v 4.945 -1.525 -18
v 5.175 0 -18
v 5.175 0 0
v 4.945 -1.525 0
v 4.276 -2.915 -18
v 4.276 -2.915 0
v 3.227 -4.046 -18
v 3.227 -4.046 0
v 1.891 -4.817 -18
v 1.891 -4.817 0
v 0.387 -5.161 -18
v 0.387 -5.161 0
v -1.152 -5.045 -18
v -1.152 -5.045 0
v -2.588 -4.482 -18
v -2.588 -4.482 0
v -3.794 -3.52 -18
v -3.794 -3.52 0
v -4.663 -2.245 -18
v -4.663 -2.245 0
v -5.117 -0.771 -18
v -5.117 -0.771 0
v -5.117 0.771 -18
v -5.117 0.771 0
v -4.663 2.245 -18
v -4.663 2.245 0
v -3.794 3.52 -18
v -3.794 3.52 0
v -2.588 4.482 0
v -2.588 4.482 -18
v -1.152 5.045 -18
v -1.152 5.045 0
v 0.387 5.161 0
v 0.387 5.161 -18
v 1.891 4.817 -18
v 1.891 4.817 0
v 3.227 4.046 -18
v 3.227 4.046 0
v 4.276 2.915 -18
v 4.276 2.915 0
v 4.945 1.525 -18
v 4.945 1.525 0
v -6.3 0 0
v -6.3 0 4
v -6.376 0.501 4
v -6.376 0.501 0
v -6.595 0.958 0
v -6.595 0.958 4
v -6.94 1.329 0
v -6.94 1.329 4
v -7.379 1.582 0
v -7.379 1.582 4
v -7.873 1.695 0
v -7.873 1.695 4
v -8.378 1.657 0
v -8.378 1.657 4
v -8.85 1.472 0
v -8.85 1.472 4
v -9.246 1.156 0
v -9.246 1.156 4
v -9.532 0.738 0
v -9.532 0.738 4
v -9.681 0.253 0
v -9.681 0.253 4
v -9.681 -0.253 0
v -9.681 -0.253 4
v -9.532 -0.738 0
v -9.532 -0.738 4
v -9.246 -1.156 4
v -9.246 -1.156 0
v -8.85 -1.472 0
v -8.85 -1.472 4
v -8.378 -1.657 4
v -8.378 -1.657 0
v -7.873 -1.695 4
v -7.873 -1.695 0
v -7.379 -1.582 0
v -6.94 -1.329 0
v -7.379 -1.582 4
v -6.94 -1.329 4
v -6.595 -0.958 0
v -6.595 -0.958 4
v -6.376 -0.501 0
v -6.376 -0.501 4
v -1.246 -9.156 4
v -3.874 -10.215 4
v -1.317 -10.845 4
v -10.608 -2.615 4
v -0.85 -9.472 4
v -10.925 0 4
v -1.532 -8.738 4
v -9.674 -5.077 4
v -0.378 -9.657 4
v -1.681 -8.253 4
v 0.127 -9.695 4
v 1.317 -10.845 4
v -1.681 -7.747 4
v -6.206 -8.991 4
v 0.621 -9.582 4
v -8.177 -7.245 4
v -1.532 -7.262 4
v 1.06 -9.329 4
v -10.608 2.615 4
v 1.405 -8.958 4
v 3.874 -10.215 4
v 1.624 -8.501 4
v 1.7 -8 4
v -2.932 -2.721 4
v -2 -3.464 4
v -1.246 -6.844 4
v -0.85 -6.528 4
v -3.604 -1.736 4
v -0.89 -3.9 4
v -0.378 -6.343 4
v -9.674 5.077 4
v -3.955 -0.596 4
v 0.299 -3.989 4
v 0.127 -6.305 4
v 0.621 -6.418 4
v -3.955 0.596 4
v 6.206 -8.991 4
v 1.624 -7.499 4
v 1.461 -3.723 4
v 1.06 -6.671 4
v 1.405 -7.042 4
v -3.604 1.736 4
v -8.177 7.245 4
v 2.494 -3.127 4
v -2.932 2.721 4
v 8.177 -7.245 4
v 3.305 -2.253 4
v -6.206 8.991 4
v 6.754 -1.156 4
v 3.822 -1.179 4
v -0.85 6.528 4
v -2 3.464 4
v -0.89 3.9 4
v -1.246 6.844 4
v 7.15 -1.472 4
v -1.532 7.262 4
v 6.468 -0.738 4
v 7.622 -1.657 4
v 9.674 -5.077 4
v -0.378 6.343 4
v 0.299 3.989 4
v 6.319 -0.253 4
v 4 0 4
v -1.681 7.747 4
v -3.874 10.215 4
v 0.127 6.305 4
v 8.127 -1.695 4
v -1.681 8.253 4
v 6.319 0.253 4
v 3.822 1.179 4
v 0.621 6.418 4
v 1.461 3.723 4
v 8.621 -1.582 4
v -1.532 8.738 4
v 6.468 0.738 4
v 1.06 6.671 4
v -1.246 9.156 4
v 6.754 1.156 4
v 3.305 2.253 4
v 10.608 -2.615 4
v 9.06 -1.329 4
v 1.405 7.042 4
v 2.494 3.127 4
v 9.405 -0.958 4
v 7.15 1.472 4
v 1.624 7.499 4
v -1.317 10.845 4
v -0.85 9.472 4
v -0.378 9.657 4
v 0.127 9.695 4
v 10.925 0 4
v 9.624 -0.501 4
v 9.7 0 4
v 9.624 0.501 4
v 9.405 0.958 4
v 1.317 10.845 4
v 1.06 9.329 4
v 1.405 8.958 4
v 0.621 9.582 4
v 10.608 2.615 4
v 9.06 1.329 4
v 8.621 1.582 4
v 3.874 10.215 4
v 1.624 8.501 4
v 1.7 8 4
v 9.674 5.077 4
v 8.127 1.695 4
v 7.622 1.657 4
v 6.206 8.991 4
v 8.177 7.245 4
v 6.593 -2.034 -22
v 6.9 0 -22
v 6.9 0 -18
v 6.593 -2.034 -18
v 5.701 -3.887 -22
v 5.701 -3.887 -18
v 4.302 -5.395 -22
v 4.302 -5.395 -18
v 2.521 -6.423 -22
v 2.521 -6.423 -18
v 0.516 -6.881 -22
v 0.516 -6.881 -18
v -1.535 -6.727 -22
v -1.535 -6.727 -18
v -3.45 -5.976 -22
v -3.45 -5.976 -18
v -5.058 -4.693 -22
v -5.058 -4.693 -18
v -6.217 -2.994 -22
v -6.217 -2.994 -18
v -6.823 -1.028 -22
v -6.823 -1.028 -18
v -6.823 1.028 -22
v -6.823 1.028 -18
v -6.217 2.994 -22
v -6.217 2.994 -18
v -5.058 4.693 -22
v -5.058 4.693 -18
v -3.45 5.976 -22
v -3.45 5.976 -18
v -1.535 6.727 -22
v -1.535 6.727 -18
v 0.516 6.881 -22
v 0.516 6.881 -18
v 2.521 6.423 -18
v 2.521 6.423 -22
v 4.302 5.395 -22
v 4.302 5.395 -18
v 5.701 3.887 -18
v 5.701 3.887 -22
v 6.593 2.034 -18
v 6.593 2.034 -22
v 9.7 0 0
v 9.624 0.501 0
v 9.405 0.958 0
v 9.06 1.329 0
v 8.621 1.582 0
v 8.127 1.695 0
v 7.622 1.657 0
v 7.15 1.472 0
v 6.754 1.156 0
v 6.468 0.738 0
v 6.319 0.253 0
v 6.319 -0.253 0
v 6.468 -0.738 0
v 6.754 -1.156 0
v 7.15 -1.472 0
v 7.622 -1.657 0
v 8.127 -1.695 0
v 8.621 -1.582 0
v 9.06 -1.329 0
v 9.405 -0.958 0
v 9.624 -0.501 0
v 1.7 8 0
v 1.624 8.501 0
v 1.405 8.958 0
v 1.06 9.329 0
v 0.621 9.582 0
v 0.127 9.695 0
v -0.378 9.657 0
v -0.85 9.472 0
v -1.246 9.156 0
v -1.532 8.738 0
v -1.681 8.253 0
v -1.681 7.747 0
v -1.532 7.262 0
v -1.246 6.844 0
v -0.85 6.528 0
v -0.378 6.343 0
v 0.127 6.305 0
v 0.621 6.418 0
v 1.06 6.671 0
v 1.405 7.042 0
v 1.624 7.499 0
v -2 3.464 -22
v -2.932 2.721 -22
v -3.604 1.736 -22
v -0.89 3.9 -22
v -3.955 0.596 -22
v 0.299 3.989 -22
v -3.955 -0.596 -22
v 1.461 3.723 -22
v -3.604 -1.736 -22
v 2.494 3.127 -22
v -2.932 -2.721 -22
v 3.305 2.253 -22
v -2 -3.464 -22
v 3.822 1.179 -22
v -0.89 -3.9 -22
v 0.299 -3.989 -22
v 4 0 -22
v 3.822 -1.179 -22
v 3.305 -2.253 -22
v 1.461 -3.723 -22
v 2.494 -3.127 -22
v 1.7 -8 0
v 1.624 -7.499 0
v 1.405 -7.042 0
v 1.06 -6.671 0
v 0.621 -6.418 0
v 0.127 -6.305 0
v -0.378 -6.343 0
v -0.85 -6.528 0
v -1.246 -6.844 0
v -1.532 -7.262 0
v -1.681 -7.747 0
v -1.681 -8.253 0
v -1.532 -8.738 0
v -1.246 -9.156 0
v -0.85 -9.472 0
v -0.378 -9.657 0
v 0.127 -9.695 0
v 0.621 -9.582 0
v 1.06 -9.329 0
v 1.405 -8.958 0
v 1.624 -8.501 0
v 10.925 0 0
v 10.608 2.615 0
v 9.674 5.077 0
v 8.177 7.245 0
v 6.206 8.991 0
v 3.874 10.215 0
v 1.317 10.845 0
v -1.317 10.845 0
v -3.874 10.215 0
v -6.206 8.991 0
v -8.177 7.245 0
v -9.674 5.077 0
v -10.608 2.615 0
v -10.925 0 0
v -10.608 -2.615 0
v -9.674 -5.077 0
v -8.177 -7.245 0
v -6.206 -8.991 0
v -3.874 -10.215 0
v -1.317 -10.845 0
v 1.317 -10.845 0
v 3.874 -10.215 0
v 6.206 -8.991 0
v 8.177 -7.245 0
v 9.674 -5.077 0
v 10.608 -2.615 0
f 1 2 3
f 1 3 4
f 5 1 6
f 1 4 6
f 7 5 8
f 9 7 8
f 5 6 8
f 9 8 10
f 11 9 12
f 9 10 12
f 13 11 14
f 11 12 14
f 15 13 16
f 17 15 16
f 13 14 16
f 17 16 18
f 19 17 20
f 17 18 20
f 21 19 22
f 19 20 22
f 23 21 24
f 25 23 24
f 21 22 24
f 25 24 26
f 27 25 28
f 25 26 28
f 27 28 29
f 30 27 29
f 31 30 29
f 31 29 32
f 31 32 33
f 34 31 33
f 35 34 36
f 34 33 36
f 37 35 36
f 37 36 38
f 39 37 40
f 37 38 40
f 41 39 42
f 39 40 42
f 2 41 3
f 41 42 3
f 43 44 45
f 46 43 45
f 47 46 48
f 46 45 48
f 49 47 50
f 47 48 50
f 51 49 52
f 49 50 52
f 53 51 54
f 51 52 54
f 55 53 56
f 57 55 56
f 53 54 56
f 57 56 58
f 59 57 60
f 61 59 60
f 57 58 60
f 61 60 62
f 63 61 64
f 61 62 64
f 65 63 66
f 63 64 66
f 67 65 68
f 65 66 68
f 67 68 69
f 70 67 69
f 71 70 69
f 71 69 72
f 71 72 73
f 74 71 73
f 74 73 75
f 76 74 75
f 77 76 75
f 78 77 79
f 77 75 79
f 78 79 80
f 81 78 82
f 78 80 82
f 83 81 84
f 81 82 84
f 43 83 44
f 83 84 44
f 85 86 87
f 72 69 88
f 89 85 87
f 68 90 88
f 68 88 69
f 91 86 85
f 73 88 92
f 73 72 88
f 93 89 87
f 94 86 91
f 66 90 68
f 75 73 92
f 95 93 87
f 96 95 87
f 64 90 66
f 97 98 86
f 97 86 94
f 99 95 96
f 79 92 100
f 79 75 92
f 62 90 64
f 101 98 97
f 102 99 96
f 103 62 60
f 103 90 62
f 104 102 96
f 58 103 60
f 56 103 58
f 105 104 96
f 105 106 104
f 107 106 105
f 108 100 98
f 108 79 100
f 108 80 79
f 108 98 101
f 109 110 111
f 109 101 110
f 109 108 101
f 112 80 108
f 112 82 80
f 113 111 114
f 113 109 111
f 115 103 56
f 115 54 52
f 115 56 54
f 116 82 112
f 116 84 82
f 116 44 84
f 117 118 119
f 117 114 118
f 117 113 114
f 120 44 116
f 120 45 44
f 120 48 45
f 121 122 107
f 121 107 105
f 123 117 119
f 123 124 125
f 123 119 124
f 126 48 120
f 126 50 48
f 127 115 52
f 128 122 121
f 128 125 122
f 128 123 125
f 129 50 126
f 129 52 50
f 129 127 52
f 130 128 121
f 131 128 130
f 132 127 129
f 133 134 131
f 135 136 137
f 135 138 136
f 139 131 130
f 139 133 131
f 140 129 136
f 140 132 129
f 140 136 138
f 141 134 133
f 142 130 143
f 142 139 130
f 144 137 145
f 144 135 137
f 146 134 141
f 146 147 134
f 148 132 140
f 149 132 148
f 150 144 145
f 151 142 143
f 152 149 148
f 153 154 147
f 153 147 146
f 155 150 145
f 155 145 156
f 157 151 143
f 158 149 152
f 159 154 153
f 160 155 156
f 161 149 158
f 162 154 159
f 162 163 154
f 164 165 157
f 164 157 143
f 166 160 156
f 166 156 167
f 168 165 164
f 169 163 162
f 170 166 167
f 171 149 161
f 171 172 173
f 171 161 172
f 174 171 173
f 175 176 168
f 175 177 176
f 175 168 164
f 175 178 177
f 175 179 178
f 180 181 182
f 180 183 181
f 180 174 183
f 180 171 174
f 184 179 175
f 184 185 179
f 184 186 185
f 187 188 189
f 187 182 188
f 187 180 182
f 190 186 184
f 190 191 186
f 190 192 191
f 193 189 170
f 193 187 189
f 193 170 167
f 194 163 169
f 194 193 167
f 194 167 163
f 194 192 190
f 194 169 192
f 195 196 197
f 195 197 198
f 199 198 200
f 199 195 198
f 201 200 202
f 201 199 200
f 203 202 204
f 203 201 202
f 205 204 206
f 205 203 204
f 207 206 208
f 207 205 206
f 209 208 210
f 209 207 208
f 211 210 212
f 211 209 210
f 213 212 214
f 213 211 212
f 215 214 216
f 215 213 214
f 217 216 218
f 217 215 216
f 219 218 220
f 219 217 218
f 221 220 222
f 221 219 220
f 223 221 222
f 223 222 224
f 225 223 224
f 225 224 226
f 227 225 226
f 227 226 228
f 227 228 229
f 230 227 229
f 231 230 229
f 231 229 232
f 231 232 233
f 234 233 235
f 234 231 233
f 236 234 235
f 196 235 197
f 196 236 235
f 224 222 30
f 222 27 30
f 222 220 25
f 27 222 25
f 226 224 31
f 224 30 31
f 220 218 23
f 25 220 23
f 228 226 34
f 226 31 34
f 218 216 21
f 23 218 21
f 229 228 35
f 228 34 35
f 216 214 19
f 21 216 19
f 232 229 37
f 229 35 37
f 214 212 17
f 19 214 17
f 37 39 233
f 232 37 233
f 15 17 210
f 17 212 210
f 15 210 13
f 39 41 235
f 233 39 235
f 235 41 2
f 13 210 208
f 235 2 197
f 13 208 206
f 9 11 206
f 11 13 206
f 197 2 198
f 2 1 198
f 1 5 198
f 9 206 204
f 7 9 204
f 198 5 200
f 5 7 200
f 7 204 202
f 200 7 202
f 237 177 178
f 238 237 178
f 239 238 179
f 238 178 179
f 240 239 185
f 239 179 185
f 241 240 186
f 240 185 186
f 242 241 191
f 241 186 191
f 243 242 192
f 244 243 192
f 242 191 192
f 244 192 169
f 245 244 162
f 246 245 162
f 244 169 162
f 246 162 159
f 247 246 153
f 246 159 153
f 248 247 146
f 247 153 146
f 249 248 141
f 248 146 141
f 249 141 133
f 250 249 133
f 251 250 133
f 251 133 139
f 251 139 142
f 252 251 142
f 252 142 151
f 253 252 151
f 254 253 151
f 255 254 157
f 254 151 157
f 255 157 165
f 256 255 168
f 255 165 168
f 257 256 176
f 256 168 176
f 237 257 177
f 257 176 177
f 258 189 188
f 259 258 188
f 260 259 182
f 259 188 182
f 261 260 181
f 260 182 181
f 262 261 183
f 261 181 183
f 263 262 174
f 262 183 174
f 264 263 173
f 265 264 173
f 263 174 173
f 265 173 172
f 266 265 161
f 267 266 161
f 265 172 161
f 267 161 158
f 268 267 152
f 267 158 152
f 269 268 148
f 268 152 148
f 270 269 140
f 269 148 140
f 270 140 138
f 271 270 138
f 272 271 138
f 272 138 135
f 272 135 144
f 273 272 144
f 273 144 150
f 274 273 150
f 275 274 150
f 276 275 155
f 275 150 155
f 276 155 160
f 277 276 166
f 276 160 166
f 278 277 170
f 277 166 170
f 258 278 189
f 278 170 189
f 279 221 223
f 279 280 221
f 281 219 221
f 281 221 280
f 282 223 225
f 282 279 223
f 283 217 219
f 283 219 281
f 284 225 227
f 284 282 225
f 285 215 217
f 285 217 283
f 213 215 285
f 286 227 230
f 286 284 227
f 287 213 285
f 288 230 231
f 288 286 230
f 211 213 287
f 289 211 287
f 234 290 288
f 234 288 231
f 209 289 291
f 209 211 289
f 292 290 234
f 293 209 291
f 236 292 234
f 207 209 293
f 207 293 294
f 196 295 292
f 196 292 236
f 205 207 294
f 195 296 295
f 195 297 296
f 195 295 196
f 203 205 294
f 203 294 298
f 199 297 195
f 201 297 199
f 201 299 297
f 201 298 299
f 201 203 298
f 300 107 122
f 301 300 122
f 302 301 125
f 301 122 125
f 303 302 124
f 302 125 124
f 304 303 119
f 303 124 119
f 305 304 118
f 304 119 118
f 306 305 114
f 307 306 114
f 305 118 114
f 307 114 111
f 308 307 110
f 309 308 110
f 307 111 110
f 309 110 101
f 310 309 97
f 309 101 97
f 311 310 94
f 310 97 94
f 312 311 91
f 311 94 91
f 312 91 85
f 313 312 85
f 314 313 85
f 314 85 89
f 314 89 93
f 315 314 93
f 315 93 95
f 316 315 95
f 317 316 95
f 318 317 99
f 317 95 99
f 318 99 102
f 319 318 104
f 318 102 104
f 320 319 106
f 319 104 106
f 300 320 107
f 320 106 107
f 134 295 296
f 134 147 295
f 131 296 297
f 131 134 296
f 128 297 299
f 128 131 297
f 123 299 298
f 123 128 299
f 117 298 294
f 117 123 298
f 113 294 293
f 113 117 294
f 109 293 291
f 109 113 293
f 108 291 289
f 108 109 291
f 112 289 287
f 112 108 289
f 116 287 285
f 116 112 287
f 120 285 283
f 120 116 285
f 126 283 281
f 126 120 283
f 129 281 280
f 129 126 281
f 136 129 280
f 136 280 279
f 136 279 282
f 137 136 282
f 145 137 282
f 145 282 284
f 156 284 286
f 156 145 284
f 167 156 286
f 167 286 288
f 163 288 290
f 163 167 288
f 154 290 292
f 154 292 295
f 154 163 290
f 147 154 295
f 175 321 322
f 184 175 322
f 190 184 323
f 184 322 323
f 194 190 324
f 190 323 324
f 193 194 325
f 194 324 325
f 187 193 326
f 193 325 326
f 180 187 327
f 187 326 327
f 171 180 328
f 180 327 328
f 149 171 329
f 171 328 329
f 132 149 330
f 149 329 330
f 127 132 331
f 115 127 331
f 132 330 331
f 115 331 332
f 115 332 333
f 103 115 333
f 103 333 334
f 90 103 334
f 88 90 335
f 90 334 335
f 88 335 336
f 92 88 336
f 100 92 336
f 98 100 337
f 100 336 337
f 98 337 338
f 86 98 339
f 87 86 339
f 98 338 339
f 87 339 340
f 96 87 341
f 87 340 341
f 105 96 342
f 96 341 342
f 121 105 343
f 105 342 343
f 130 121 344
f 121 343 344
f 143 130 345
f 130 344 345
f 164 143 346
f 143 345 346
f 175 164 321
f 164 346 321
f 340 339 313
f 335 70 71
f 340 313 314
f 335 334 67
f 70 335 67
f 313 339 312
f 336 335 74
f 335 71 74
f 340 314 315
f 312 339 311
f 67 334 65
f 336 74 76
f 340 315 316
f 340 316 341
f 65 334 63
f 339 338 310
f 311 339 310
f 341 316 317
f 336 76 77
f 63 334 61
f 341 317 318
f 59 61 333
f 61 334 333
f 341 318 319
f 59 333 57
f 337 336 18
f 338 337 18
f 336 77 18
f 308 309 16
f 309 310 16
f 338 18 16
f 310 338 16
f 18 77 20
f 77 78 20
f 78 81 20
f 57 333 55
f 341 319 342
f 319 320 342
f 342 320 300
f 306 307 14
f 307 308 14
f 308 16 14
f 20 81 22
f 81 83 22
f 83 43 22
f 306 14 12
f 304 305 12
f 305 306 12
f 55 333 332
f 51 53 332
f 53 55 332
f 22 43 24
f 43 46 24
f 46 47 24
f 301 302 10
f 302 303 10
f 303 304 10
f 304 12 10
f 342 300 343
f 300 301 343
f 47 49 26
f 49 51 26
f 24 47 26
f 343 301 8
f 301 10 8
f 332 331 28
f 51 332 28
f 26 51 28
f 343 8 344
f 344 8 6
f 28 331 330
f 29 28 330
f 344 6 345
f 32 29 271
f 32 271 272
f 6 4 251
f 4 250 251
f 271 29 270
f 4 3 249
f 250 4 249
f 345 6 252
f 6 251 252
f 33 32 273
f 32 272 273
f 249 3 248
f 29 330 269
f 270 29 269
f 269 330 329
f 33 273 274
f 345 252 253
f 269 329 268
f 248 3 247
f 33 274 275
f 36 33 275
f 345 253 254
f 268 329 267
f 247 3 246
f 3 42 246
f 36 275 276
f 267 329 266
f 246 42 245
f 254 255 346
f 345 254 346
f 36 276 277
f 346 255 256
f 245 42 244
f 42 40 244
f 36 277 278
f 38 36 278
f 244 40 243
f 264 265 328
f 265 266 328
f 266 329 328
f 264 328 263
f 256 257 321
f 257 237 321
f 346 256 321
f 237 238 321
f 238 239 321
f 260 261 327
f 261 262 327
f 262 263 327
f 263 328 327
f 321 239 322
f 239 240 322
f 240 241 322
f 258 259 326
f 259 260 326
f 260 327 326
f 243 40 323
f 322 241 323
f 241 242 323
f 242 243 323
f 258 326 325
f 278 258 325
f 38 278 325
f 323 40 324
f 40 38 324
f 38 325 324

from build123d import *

# Parameters (mm, degrees)
F0_R     = 10.925
F0_R_2   = 4
F1_DEPTH = 4
F2_R     = 1.7
F3_DEPTH = 4
F4_R     = 5.175
F4_R_2   = 4
F5_DEPTH = 11
F6_DEPTH = 11
F7_R     = 6.9
F7_R_2   = 5.175
F8_DEPTH = 4


with BuildPart() as f1:
    # F0 (on Top) → F1 (new body)
    with BuildSketch(Plane.XY):
        Circle(F0_R)
        Circle(F0_R_2, mode=Mode.SUBTRACT)
    extrude(amount=F1_DEPTH)

    # F2 (on face) → F3 (cut, through all)
    with BuildSketch(Plane.XY.offset(4)):
        with Locations((0, 8)):
            Circle(F2_R)
        with Locations((-8, 0)):
            Circle(F2_R)
        with Locations((8, 0)):
            Circle(F2_R)
        with Locations((0, -8)):
            Circle(F2_R)
    extrude(amount=-F3_DEPTH, mode=Mode.SUBTRACT)

    # F4 (on face) → F5 (join)
    with BuildSketch(Plane(origin=(0, 0, 0), x_dir=(1, 0, 0), z_dir=(0, 0, -1))):
        Circle(F4_R)
        Circle(F4_R_2, mode=Mode.SUBTRACT)
    extrude(amount=F5_DEPTH)

    # F6 (add): a face of the model
    f6_faces = [f1.faces().sort_by_distance(p)[0] for p in [
        (-5.0286288963, 0, -11),
    ]]
    extrude(f6_faces, amount=F6_DEPTH)

    # F7 (on face) → F8 (join)
    with BuildSketch(Plane(origin=(0, 0, -22), x_dir=(1, 0, 0), z_dir=(0, 0, -1))):
        Circle(F7_R)
        Circle(F7_R_2, mode=Mode.SUBTRACT)
    extrude(amount=-F8_DEPTH)


solid = f1.part
